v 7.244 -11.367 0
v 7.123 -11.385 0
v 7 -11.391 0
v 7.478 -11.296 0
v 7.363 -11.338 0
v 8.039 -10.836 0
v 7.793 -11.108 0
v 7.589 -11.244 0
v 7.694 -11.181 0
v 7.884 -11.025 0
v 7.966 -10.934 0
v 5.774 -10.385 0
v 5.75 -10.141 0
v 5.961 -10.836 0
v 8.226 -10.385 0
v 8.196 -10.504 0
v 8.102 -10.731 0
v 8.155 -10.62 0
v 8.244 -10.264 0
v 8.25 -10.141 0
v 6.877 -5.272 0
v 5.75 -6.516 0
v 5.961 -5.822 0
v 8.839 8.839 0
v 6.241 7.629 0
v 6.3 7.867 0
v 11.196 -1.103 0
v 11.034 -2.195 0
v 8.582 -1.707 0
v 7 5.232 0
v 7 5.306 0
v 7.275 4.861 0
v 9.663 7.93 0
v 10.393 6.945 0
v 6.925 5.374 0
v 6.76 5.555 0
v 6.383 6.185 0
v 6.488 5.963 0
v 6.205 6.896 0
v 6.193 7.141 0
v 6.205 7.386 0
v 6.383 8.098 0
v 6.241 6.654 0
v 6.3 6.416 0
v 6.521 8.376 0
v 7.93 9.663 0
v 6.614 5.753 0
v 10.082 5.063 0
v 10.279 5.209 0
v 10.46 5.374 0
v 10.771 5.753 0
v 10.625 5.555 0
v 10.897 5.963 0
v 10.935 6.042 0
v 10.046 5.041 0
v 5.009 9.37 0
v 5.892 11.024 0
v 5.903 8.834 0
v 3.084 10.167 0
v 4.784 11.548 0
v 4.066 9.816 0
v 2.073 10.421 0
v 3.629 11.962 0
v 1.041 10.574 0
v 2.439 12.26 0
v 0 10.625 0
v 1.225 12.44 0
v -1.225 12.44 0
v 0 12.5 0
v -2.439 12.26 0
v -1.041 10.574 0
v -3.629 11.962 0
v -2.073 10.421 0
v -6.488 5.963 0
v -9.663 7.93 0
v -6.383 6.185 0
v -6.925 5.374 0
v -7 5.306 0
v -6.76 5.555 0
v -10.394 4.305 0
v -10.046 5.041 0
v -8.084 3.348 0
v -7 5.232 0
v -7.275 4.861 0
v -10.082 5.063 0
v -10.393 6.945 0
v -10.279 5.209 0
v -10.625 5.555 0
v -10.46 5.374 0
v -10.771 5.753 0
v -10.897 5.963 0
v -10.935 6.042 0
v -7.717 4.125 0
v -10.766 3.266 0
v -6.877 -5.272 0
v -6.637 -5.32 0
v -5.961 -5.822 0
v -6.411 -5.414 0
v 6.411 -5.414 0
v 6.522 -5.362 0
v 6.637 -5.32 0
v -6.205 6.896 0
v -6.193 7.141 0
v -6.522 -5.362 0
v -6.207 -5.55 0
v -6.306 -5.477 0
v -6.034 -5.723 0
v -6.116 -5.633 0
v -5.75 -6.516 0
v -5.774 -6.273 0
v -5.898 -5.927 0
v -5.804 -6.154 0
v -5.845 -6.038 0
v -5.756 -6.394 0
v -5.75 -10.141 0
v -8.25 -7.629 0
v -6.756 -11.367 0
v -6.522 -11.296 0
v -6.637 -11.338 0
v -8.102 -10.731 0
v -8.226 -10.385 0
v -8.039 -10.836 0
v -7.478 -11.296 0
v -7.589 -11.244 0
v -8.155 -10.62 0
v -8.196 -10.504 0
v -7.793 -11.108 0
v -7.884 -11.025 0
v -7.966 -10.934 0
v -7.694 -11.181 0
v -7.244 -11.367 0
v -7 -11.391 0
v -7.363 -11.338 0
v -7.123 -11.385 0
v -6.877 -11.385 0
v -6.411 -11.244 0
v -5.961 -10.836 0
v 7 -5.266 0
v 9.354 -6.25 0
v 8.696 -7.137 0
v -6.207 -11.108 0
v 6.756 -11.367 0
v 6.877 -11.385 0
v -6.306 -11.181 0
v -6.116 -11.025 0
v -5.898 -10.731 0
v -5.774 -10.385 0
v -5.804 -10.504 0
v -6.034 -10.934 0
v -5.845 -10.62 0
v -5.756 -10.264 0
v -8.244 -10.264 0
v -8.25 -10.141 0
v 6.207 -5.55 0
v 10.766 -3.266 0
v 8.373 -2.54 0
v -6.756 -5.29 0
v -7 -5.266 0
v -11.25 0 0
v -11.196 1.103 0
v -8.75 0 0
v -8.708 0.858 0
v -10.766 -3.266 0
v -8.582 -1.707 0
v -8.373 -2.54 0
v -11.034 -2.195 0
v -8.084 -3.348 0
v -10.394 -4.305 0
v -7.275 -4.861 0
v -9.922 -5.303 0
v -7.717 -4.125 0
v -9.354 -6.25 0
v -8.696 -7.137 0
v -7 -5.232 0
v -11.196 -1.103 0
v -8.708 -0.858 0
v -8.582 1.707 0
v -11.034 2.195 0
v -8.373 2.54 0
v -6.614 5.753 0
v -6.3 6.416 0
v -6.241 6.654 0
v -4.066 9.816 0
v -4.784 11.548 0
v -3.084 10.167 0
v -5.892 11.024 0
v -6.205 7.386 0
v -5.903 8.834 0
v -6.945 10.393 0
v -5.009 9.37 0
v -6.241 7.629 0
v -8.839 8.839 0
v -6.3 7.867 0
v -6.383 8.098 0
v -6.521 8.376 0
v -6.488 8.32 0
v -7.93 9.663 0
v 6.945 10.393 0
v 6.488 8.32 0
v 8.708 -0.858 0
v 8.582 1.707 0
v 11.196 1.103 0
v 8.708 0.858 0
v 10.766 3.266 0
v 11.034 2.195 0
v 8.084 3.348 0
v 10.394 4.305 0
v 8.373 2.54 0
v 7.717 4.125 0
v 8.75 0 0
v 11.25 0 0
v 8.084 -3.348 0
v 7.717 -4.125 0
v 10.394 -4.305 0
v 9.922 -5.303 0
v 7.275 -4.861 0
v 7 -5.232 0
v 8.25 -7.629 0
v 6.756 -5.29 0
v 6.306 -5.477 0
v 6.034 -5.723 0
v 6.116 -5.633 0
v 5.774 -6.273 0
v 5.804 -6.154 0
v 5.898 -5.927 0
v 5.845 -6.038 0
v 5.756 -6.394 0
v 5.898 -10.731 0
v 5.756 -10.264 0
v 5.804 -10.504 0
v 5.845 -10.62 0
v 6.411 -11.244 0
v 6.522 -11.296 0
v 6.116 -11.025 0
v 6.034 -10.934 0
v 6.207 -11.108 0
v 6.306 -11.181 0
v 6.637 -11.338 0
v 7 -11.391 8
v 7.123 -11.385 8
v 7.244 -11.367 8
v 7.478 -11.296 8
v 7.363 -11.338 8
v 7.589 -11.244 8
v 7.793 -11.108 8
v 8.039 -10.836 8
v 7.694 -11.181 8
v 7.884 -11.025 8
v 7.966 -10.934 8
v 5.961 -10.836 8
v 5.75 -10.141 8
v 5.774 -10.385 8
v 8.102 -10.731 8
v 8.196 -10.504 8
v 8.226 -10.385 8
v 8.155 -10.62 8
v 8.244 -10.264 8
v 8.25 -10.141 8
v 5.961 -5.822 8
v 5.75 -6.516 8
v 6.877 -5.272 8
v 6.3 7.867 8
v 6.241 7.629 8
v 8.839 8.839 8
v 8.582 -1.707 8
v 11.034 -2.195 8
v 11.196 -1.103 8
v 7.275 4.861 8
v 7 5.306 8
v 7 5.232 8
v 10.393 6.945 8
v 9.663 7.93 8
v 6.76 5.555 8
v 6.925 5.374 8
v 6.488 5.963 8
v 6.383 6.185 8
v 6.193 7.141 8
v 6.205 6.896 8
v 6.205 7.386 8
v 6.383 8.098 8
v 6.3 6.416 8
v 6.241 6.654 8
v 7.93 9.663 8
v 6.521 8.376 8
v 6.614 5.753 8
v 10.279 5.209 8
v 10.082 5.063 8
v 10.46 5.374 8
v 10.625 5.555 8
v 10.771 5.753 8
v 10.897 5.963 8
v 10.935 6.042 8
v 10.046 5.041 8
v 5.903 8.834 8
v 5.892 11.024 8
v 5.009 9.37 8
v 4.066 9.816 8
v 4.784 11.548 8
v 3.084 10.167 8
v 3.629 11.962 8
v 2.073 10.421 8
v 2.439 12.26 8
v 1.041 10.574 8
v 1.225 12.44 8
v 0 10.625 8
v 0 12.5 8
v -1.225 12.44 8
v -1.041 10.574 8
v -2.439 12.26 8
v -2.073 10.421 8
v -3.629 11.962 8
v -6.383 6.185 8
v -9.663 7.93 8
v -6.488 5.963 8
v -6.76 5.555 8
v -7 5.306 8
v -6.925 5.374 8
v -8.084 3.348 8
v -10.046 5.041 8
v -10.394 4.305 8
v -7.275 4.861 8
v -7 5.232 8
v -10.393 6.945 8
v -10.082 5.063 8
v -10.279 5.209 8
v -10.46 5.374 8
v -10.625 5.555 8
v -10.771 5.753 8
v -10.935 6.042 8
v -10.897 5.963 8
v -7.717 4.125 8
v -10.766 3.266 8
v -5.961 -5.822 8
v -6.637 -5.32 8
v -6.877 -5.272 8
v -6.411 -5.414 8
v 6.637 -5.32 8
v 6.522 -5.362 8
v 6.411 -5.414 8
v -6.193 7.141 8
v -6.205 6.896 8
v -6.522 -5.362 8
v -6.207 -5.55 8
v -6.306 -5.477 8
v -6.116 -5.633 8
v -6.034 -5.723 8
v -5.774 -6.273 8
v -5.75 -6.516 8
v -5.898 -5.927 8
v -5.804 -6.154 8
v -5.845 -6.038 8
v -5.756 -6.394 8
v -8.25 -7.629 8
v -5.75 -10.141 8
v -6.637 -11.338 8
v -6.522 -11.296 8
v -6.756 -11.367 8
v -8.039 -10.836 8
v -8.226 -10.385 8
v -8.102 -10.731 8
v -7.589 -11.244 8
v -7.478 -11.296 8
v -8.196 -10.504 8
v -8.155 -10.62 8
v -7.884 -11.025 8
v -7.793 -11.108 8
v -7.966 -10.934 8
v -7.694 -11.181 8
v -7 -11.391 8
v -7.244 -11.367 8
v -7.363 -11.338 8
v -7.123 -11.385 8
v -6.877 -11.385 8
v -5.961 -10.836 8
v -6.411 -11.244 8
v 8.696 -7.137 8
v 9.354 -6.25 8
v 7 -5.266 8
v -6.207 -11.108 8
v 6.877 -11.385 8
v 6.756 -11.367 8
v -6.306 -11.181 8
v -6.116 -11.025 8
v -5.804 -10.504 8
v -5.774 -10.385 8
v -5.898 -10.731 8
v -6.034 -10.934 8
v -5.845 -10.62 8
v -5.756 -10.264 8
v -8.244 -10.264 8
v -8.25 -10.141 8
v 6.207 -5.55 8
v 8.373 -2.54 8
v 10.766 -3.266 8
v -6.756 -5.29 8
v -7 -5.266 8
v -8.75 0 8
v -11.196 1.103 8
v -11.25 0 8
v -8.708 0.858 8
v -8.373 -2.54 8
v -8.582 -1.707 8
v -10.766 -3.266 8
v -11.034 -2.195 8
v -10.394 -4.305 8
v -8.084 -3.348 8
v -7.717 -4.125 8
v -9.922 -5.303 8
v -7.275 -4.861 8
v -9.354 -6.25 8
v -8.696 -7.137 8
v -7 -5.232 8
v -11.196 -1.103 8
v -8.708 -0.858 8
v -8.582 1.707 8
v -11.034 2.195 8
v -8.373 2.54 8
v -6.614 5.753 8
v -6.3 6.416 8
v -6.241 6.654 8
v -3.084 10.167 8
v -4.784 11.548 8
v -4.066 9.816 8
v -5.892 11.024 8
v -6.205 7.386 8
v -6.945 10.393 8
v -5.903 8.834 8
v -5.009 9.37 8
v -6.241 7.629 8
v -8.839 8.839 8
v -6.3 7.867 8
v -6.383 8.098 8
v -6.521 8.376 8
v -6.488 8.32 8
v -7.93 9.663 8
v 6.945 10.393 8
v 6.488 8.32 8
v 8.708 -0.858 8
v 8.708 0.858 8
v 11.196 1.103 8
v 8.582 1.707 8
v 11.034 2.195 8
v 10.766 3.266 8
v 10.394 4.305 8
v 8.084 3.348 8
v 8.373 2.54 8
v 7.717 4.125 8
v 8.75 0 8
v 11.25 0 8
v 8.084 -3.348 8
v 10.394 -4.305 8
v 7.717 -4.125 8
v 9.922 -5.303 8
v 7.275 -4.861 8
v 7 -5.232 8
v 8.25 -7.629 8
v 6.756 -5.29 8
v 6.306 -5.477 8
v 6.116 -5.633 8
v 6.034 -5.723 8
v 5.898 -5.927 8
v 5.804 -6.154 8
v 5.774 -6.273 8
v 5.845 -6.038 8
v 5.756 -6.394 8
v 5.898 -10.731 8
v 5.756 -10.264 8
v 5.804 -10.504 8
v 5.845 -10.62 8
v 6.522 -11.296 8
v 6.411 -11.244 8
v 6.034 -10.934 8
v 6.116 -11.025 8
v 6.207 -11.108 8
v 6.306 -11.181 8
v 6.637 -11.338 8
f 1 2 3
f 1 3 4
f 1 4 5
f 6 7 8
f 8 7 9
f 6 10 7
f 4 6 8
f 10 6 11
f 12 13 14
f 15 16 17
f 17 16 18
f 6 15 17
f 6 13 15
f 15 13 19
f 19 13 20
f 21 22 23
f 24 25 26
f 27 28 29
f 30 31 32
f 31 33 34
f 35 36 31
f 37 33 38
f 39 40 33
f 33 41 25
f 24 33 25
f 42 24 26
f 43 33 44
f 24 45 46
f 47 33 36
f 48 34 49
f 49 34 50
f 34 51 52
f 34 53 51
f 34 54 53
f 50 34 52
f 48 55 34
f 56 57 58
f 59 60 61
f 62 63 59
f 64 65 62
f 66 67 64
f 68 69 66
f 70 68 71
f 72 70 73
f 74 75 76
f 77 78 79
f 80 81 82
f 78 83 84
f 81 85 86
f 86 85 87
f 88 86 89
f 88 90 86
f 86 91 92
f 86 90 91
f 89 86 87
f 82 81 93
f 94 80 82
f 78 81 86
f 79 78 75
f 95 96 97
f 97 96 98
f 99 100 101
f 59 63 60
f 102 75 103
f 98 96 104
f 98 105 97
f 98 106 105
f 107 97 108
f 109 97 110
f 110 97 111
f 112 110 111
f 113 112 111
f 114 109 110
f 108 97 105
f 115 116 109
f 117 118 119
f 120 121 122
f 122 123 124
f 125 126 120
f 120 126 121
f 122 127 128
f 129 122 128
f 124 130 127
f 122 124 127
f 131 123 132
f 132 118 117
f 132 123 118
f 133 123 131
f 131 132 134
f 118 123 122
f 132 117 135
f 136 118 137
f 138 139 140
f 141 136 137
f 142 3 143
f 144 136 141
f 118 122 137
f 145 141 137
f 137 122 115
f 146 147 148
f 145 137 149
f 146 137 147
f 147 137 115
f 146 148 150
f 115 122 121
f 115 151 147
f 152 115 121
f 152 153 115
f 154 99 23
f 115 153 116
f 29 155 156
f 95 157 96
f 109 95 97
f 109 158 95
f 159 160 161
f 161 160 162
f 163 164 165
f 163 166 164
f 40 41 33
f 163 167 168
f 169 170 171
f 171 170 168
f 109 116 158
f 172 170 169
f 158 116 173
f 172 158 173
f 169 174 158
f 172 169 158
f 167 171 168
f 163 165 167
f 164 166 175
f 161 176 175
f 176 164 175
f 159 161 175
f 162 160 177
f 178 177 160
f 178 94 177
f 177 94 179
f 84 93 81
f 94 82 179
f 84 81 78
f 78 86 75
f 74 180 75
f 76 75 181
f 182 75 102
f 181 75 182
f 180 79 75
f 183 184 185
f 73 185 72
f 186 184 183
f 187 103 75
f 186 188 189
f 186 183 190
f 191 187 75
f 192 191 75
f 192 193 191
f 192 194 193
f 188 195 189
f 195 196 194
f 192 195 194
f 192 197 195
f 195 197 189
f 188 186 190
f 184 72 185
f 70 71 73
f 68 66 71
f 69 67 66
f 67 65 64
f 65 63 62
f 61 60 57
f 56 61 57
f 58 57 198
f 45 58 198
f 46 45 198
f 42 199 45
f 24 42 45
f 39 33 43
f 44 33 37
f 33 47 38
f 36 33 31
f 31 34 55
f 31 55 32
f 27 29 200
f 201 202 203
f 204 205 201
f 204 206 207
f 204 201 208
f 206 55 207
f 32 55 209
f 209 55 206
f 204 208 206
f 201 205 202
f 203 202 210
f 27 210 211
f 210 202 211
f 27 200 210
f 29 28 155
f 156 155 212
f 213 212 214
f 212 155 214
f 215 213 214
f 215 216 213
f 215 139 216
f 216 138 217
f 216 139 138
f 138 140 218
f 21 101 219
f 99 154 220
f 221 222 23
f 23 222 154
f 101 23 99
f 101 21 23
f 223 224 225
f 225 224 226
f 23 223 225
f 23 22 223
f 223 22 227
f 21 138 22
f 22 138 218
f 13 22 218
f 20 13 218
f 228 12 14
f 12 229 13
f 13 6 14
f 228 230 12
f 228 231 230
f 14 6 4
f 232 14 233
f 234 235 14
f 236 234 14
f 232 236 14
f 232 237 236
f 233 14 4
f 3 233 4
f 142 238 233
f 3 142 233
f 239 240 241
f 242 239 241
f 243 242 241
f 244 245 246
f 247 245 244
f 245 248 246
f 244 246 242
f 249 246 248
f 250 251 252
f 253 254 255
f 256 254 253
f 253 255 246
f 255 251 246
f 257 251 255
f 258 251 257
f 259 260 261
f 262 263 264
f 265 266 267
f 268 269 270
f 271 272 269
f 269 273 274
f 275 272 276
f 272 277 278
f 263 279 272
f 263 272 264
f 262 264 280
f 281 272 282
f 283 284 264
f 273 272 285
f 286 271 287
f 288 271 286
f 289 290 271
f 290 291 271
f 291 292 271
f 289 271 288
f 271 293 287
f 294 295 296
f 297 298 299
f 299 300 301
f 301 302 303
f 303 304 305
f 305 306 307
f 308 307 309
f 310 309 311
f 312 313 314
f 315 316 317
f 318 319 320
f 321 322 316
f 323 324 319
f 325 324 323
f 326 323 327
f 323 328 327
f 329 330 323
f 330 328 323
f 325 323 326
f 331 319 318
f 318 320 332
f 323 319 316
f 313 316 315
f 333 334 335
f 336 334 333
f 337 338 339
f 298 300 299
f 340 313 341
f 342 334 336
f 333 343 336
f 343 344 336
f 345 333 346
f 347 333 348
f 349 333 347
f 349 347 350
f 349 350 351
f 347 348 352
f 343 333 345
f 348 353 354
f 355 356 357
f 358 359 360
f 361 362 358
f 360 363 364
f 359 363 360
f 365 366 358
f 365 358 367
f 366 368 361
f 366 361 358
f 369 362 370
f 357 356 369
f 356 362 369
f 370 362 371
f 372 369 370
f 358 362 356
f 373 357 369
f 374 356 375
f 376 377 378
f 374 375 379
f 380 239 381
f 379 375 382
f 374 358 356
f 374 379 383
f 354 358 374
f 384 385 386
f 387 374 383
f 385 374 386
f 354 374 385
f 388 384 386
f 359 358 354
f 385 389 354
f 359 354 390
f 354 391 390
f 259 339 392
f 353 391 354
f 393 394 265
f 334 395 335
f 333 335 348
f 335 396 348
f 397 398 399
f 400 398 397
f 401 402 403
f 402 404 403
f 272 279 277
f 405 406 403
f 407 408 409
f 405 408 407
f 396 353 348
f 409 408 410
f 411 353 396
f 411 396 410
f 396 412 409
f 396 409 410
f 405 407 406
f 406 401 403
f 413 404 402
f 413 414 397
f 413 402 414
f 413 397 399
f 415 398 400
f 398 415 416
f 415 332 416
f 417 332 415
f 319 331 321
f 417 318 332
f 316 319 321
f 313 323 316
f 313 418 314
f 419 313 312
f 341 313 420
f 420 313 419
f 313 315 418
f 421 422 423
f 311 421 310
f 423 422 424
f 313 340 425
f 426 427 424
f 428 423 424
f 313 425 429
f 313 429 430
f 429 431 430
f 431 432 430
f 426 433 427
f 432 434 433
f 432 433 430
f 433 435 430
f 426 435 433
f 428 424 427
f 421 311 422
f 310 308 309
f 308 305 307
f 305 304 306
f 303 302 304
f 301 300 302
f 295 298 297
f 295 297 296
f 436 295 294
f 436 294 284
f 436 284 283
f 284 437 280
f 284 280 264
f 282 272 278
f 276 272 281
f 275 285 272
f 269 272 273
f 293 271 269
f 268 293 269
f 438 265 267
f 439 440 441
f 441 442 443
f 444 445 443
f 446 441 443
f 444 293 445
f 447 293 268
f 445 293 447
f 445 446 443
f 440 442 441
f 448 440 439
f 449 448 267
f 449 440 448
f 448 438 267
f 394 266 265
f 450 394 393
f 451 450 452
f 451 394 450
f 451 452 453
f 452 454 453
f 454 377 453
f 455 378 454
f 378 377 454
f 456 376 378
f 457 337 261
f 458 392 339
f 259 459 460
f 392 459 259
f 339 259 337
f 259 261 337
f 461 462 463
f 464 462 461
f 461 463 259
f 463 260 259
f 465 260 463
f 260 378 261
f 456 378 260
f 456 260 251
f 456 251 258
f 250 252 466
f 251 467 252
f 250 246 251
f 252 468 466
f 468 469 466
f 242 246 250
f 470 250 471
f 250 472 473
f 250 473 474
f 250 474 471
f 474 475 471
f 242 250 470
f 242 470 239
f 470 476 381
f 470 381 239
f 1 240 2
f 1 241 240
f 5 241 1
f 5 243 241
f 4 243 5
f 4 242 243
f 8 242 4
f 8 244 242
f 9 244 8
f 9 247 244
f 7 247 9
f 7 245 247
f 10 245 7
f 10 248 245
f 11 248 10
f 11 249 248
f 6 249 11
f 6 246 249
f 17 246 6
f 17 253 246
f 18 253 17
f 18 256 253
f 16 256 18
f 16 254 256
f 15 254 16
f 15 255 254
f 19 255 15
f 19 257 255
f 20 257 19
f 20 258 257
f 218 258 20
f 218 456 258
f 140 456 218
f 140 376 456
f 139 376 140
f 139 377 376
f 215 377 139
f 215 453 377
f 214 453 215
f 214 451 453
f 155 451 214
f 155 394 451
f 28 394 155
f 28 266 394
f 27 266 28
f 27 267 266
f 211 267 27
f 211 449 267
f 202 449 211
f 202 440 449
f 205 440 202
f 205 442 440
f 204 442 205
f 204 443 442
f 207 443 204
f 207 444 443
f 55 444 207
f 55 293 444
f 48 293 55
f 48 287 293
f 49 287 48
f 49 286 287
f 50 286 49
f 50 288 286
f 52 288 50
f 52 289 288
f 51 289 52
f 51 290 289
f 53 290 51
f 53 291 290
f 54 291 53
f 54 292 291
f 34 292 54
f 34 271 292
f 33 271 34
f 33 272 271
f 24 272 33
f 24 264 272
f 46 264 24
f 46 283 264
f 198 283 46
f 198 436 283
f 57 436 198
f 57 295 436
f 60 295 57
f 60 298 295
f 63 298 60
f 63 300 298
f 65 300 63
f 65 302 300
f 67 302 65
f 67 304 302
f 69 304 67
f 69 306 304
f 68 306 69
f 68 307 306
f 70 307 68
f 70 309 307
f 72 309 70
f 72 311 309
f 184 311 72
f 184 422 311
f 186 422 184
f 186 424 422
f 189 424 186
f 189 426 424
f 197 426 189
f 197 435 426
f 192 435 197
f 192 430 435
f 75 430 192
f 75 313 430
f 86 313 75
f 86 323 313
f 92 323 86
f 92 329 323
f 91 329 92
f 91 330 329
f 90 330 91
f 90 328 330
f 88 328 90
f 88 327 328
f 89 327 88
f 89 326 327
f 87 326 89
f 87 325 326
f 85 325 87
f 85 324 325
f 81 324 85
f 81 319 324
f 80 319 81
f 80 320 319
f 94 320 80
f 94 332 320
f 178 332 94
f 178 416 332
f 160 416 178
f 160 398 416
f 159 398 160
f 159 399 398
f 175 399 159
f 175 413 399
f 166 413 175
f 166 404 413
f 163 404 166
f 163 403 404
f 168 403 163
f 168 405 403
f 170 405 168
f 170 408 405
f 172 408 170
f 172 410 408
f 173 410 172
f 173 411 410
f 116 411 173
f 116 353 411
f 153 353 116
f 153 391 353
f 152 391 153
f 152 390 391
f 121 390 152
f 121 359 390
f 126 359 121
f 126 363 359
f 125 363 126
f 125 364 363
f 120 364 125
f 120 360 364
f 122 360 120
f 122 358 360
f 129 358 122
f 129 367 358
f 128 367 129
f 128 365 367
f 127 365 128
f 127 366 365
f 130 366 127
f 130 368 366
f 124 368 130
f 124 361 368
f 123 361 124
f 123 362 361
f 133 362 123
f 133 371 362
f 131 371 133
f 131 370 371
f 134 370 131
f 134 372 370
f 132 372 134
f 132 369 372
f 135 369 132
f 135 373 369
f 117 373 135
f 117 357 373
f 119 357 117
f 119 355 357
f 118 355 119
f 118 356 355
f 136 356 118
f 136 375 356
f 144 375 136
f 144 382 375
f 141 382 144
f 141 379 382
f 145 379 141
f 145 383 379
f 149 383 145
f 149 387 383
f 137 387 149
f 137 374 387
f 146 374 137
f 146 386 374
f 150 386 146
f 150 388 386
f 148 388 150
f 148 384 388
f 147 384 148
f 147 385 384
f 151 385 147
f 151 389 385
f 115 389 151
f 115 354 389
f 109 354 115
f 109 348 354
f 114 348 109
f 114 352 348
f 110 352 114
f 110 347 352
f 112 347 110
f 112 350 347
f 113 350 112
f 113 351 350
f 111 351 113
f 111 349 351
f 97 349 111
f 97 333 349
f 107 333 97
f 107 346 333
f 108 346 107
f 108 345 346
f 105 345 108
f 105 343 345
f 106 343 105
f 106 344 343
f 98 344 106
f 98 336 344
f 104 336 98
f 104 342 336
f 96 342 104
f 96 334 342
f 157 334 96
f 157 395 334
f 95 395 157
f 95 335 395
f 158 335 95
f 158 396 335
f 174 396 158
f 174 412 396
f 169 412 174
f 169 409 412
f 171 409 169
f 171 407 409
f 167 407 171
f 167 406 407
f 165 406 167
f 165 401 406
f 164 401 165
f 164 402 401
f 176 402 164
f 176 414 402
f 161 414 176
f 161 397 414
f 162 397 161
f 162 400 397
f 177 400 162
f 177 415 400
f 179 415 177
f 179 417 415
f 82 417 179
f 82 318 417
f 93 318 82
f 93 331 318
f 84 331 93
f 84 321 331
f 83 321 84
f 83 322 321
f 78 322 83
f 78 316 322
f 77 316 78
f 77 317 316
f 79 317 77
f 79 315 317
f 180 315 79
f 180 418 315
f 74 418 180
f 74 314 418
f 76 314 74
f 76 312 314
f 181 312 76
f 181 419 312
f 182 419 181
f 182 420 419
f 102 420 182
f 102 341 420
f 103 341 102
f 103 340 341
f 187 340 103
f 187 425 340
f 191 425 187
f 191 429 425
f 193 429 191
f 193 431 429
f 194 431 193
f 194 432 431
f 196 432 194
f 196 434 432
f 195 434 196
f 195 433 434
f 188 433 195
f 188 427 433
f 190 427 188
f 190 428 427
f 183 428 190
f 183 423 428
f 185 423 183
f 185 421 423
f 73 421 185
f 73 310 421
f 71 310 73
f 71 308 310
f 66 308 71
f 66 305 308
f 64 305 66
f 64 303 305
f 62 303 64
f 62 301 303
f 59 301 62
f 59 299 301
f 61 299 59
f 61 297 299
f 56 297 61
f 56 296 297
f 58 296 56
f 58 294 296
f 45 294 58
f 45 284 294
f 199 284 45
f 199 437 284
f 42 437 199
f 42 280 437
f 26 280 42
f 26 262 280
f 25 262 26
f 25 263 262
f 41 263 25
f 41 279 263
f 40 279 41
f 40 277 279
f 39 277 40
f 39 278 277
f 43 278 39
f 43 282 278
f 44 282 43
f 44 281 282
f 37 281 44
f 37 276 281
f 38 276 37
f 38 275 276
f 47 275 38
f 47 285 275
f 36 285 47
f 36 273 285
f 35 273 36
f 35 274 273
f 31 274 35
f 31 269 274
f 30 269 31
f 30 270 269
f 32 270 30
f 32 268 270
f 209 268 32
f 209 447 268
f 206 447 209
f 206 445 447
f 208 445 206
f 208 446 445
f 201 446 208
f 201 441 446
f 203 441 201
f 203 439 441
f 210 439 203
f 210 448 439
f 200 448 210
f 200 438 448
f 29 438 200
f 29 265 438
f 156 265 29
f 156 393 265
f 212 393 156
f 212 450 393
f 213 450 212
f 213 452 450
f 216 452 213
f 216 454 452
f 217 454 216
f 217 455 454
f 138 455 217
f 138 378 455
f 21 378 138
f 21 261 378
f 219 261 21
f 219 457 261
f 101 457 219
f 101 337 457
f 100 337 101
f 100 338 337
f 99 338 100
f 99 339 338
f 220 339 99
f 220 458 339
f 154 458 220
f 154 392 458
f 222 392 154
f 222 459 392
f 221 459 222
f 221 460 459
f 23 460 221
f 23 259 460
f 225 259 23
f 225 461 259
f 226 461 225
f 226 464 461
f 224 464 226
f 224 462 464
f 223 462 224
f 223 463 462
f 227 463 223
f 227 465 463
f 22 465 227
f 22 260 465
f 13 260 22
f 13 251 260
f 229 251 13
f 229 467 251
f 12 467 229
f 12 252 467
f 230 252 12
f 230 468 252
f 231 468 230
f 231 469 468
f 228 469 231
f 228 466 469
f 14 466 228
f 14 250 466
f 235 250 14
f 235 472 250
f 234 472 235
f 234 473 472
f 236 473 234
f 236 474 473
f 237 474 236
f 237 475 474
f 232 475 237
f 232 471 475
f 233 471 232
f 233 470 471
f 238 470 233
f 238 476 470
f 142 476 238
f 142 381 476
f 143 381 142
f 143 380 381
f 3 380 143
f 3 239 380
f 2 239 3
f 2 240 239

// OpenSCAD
thickness = 2.5;
height = 8;
diameter = 17.5;
gap = 14;
barLength = 3;
$fn=64;

size = diameter/2;

module ring() {
    
    // Top and bottom supports
    difference() {
        circle(size + thickness);
        circle(size);
        polygon([[-gap/2, size+thickness], [gap/2, size+thickness], [gap/2, -size-thickness], [-gap/2, -size-thickness]]);
    }

    midline = (size + thickness/2);
    gap_y = sqrt(midline*midline - (gap/2)*(gap/2));

    // Left bar
    hull() {
      translate([-gap/2, -gap_y+thickness/4]) circle(thickness/2);
      translate([-gap/2, -gap_y - barLength]) circle(thickness/2);
    }

    // Right bar
    hull() {
      translate([gap/2, -gap_y+thickness/4]) circle(thickness/2);
      translate([gap/2, -gap_y - barLength]) circle(thickness/2);
    }

    // Size brace
    difference() {
        circle(midline + thickness);
        circle(midline + thickness/4); 
        polygon([ [-diameter, gap_y], [diameter, gap_y], [diameter, -gap_y-barLength-thickness],[-diameter, -gap_y-barLength-thickness] ]);
    }
    
    r = midline + thickness/2;
    y = gap_y;
    brace_x = sqrt(r*r - y*y);
    
    difference() {
      union() {
        translate([-brace_x, y]) circle(thickness);
        translate([ brace_x, y]) circle(thickness);
      }
       difference() {
          circle(midline+thickness*2);
          circle(midline+thickness);
      }
    }
}

linear_extrude(height=height) {
    ring();
}
